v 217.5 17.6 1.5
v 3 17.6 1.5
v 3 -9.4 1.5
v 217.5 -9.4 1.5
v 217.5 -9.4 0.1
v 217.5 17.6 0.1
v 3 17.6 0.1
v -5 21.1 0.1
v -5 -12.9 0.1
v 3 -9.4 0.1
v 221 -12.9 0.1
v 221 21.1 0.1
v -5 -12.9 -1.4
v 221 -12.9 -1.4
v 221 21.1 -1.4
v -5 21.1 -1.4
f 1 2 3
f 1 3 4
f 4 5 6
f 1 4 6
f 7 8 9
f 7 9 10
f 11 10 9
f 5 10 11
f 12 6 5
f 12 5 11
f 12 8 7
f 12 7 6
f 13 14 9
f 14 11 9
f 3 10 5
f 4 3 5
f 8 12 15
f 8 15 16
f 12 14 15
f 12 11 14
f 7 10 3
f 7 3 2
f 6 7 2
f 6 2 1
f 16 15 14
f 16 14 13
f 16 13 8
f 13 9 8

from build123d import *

# Parameters (mm, degrees)
SKETCH_1_W      = 226
SKETCH_1_H      = 34
SKETCH_1_W_2    = 214.5
SKETCH_1_H_2    = 27
EXTRUDE_1_DEPTH = 0.1
SKETCH_2_W      = 226
SKETCH_2_H      = 34
EXTRUDE_2_DEPTH = 1.4
SKETCH_3_W      = 214.5
SKETCH_3_H      = 27
EXTRUDE_3_DEPTH = 1.5


with BuildPart() as part:
    # Эскиз1 → Бобышка-Вытянуть1 (new body)
    with BuildSketch(Plane.XY):
        with Locations((108, 4.1)):
            Rectangle(SKETCH_1_W, SKETCH_1_H)
        with Locations((110.25, 4.1)):
            Rectangle(SKETCH_1_W_2, SKETCH_1_H_2, mode=Mode.SUBTRACT)
    extrude(amount=EXTRUDE_1_DEPTH)

    # Эскиз2 → Бобышка-Вытянуть2 (add)
    with BuildSketch(Plane(origin=(0, 0, 0), x_dir=(-1, 0, 0), z_dir=(0, 0, -1))):
        with Locations((-108, 4.1)):
            Rectangle(SKETCH_2_W, SKETCH_2_H)
    extrude(amount=EXTRUDE_2_DEPTH)

    # Эскиз3 → Бобышка-Вытянуть3 (add)
    with BuildSketch(Plane.XY):
        with Locations((110.25, 4.1)):
            Rectangle(SKETCH_3_W, SKETCH_3_H)
    extrude(amount=EXTRUDE_3_DEPTH)


solid = part.part
